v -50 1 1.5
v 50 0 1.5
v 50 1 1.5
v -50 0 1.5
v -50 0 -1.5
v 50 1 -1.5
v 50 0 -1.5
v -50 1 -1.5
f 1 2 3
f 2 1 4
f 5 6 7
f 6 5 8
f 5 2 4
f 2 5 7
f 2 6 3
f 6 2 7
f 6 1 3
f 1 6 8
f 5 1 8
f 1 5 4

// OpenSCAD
module gridrod(length=100, width=3, depth=1) 
{
    color([0.7,0.2,0.3])
    translate([0,depth/2,0])
    cube([length, depth, width], center=true);
}

gridrod();
